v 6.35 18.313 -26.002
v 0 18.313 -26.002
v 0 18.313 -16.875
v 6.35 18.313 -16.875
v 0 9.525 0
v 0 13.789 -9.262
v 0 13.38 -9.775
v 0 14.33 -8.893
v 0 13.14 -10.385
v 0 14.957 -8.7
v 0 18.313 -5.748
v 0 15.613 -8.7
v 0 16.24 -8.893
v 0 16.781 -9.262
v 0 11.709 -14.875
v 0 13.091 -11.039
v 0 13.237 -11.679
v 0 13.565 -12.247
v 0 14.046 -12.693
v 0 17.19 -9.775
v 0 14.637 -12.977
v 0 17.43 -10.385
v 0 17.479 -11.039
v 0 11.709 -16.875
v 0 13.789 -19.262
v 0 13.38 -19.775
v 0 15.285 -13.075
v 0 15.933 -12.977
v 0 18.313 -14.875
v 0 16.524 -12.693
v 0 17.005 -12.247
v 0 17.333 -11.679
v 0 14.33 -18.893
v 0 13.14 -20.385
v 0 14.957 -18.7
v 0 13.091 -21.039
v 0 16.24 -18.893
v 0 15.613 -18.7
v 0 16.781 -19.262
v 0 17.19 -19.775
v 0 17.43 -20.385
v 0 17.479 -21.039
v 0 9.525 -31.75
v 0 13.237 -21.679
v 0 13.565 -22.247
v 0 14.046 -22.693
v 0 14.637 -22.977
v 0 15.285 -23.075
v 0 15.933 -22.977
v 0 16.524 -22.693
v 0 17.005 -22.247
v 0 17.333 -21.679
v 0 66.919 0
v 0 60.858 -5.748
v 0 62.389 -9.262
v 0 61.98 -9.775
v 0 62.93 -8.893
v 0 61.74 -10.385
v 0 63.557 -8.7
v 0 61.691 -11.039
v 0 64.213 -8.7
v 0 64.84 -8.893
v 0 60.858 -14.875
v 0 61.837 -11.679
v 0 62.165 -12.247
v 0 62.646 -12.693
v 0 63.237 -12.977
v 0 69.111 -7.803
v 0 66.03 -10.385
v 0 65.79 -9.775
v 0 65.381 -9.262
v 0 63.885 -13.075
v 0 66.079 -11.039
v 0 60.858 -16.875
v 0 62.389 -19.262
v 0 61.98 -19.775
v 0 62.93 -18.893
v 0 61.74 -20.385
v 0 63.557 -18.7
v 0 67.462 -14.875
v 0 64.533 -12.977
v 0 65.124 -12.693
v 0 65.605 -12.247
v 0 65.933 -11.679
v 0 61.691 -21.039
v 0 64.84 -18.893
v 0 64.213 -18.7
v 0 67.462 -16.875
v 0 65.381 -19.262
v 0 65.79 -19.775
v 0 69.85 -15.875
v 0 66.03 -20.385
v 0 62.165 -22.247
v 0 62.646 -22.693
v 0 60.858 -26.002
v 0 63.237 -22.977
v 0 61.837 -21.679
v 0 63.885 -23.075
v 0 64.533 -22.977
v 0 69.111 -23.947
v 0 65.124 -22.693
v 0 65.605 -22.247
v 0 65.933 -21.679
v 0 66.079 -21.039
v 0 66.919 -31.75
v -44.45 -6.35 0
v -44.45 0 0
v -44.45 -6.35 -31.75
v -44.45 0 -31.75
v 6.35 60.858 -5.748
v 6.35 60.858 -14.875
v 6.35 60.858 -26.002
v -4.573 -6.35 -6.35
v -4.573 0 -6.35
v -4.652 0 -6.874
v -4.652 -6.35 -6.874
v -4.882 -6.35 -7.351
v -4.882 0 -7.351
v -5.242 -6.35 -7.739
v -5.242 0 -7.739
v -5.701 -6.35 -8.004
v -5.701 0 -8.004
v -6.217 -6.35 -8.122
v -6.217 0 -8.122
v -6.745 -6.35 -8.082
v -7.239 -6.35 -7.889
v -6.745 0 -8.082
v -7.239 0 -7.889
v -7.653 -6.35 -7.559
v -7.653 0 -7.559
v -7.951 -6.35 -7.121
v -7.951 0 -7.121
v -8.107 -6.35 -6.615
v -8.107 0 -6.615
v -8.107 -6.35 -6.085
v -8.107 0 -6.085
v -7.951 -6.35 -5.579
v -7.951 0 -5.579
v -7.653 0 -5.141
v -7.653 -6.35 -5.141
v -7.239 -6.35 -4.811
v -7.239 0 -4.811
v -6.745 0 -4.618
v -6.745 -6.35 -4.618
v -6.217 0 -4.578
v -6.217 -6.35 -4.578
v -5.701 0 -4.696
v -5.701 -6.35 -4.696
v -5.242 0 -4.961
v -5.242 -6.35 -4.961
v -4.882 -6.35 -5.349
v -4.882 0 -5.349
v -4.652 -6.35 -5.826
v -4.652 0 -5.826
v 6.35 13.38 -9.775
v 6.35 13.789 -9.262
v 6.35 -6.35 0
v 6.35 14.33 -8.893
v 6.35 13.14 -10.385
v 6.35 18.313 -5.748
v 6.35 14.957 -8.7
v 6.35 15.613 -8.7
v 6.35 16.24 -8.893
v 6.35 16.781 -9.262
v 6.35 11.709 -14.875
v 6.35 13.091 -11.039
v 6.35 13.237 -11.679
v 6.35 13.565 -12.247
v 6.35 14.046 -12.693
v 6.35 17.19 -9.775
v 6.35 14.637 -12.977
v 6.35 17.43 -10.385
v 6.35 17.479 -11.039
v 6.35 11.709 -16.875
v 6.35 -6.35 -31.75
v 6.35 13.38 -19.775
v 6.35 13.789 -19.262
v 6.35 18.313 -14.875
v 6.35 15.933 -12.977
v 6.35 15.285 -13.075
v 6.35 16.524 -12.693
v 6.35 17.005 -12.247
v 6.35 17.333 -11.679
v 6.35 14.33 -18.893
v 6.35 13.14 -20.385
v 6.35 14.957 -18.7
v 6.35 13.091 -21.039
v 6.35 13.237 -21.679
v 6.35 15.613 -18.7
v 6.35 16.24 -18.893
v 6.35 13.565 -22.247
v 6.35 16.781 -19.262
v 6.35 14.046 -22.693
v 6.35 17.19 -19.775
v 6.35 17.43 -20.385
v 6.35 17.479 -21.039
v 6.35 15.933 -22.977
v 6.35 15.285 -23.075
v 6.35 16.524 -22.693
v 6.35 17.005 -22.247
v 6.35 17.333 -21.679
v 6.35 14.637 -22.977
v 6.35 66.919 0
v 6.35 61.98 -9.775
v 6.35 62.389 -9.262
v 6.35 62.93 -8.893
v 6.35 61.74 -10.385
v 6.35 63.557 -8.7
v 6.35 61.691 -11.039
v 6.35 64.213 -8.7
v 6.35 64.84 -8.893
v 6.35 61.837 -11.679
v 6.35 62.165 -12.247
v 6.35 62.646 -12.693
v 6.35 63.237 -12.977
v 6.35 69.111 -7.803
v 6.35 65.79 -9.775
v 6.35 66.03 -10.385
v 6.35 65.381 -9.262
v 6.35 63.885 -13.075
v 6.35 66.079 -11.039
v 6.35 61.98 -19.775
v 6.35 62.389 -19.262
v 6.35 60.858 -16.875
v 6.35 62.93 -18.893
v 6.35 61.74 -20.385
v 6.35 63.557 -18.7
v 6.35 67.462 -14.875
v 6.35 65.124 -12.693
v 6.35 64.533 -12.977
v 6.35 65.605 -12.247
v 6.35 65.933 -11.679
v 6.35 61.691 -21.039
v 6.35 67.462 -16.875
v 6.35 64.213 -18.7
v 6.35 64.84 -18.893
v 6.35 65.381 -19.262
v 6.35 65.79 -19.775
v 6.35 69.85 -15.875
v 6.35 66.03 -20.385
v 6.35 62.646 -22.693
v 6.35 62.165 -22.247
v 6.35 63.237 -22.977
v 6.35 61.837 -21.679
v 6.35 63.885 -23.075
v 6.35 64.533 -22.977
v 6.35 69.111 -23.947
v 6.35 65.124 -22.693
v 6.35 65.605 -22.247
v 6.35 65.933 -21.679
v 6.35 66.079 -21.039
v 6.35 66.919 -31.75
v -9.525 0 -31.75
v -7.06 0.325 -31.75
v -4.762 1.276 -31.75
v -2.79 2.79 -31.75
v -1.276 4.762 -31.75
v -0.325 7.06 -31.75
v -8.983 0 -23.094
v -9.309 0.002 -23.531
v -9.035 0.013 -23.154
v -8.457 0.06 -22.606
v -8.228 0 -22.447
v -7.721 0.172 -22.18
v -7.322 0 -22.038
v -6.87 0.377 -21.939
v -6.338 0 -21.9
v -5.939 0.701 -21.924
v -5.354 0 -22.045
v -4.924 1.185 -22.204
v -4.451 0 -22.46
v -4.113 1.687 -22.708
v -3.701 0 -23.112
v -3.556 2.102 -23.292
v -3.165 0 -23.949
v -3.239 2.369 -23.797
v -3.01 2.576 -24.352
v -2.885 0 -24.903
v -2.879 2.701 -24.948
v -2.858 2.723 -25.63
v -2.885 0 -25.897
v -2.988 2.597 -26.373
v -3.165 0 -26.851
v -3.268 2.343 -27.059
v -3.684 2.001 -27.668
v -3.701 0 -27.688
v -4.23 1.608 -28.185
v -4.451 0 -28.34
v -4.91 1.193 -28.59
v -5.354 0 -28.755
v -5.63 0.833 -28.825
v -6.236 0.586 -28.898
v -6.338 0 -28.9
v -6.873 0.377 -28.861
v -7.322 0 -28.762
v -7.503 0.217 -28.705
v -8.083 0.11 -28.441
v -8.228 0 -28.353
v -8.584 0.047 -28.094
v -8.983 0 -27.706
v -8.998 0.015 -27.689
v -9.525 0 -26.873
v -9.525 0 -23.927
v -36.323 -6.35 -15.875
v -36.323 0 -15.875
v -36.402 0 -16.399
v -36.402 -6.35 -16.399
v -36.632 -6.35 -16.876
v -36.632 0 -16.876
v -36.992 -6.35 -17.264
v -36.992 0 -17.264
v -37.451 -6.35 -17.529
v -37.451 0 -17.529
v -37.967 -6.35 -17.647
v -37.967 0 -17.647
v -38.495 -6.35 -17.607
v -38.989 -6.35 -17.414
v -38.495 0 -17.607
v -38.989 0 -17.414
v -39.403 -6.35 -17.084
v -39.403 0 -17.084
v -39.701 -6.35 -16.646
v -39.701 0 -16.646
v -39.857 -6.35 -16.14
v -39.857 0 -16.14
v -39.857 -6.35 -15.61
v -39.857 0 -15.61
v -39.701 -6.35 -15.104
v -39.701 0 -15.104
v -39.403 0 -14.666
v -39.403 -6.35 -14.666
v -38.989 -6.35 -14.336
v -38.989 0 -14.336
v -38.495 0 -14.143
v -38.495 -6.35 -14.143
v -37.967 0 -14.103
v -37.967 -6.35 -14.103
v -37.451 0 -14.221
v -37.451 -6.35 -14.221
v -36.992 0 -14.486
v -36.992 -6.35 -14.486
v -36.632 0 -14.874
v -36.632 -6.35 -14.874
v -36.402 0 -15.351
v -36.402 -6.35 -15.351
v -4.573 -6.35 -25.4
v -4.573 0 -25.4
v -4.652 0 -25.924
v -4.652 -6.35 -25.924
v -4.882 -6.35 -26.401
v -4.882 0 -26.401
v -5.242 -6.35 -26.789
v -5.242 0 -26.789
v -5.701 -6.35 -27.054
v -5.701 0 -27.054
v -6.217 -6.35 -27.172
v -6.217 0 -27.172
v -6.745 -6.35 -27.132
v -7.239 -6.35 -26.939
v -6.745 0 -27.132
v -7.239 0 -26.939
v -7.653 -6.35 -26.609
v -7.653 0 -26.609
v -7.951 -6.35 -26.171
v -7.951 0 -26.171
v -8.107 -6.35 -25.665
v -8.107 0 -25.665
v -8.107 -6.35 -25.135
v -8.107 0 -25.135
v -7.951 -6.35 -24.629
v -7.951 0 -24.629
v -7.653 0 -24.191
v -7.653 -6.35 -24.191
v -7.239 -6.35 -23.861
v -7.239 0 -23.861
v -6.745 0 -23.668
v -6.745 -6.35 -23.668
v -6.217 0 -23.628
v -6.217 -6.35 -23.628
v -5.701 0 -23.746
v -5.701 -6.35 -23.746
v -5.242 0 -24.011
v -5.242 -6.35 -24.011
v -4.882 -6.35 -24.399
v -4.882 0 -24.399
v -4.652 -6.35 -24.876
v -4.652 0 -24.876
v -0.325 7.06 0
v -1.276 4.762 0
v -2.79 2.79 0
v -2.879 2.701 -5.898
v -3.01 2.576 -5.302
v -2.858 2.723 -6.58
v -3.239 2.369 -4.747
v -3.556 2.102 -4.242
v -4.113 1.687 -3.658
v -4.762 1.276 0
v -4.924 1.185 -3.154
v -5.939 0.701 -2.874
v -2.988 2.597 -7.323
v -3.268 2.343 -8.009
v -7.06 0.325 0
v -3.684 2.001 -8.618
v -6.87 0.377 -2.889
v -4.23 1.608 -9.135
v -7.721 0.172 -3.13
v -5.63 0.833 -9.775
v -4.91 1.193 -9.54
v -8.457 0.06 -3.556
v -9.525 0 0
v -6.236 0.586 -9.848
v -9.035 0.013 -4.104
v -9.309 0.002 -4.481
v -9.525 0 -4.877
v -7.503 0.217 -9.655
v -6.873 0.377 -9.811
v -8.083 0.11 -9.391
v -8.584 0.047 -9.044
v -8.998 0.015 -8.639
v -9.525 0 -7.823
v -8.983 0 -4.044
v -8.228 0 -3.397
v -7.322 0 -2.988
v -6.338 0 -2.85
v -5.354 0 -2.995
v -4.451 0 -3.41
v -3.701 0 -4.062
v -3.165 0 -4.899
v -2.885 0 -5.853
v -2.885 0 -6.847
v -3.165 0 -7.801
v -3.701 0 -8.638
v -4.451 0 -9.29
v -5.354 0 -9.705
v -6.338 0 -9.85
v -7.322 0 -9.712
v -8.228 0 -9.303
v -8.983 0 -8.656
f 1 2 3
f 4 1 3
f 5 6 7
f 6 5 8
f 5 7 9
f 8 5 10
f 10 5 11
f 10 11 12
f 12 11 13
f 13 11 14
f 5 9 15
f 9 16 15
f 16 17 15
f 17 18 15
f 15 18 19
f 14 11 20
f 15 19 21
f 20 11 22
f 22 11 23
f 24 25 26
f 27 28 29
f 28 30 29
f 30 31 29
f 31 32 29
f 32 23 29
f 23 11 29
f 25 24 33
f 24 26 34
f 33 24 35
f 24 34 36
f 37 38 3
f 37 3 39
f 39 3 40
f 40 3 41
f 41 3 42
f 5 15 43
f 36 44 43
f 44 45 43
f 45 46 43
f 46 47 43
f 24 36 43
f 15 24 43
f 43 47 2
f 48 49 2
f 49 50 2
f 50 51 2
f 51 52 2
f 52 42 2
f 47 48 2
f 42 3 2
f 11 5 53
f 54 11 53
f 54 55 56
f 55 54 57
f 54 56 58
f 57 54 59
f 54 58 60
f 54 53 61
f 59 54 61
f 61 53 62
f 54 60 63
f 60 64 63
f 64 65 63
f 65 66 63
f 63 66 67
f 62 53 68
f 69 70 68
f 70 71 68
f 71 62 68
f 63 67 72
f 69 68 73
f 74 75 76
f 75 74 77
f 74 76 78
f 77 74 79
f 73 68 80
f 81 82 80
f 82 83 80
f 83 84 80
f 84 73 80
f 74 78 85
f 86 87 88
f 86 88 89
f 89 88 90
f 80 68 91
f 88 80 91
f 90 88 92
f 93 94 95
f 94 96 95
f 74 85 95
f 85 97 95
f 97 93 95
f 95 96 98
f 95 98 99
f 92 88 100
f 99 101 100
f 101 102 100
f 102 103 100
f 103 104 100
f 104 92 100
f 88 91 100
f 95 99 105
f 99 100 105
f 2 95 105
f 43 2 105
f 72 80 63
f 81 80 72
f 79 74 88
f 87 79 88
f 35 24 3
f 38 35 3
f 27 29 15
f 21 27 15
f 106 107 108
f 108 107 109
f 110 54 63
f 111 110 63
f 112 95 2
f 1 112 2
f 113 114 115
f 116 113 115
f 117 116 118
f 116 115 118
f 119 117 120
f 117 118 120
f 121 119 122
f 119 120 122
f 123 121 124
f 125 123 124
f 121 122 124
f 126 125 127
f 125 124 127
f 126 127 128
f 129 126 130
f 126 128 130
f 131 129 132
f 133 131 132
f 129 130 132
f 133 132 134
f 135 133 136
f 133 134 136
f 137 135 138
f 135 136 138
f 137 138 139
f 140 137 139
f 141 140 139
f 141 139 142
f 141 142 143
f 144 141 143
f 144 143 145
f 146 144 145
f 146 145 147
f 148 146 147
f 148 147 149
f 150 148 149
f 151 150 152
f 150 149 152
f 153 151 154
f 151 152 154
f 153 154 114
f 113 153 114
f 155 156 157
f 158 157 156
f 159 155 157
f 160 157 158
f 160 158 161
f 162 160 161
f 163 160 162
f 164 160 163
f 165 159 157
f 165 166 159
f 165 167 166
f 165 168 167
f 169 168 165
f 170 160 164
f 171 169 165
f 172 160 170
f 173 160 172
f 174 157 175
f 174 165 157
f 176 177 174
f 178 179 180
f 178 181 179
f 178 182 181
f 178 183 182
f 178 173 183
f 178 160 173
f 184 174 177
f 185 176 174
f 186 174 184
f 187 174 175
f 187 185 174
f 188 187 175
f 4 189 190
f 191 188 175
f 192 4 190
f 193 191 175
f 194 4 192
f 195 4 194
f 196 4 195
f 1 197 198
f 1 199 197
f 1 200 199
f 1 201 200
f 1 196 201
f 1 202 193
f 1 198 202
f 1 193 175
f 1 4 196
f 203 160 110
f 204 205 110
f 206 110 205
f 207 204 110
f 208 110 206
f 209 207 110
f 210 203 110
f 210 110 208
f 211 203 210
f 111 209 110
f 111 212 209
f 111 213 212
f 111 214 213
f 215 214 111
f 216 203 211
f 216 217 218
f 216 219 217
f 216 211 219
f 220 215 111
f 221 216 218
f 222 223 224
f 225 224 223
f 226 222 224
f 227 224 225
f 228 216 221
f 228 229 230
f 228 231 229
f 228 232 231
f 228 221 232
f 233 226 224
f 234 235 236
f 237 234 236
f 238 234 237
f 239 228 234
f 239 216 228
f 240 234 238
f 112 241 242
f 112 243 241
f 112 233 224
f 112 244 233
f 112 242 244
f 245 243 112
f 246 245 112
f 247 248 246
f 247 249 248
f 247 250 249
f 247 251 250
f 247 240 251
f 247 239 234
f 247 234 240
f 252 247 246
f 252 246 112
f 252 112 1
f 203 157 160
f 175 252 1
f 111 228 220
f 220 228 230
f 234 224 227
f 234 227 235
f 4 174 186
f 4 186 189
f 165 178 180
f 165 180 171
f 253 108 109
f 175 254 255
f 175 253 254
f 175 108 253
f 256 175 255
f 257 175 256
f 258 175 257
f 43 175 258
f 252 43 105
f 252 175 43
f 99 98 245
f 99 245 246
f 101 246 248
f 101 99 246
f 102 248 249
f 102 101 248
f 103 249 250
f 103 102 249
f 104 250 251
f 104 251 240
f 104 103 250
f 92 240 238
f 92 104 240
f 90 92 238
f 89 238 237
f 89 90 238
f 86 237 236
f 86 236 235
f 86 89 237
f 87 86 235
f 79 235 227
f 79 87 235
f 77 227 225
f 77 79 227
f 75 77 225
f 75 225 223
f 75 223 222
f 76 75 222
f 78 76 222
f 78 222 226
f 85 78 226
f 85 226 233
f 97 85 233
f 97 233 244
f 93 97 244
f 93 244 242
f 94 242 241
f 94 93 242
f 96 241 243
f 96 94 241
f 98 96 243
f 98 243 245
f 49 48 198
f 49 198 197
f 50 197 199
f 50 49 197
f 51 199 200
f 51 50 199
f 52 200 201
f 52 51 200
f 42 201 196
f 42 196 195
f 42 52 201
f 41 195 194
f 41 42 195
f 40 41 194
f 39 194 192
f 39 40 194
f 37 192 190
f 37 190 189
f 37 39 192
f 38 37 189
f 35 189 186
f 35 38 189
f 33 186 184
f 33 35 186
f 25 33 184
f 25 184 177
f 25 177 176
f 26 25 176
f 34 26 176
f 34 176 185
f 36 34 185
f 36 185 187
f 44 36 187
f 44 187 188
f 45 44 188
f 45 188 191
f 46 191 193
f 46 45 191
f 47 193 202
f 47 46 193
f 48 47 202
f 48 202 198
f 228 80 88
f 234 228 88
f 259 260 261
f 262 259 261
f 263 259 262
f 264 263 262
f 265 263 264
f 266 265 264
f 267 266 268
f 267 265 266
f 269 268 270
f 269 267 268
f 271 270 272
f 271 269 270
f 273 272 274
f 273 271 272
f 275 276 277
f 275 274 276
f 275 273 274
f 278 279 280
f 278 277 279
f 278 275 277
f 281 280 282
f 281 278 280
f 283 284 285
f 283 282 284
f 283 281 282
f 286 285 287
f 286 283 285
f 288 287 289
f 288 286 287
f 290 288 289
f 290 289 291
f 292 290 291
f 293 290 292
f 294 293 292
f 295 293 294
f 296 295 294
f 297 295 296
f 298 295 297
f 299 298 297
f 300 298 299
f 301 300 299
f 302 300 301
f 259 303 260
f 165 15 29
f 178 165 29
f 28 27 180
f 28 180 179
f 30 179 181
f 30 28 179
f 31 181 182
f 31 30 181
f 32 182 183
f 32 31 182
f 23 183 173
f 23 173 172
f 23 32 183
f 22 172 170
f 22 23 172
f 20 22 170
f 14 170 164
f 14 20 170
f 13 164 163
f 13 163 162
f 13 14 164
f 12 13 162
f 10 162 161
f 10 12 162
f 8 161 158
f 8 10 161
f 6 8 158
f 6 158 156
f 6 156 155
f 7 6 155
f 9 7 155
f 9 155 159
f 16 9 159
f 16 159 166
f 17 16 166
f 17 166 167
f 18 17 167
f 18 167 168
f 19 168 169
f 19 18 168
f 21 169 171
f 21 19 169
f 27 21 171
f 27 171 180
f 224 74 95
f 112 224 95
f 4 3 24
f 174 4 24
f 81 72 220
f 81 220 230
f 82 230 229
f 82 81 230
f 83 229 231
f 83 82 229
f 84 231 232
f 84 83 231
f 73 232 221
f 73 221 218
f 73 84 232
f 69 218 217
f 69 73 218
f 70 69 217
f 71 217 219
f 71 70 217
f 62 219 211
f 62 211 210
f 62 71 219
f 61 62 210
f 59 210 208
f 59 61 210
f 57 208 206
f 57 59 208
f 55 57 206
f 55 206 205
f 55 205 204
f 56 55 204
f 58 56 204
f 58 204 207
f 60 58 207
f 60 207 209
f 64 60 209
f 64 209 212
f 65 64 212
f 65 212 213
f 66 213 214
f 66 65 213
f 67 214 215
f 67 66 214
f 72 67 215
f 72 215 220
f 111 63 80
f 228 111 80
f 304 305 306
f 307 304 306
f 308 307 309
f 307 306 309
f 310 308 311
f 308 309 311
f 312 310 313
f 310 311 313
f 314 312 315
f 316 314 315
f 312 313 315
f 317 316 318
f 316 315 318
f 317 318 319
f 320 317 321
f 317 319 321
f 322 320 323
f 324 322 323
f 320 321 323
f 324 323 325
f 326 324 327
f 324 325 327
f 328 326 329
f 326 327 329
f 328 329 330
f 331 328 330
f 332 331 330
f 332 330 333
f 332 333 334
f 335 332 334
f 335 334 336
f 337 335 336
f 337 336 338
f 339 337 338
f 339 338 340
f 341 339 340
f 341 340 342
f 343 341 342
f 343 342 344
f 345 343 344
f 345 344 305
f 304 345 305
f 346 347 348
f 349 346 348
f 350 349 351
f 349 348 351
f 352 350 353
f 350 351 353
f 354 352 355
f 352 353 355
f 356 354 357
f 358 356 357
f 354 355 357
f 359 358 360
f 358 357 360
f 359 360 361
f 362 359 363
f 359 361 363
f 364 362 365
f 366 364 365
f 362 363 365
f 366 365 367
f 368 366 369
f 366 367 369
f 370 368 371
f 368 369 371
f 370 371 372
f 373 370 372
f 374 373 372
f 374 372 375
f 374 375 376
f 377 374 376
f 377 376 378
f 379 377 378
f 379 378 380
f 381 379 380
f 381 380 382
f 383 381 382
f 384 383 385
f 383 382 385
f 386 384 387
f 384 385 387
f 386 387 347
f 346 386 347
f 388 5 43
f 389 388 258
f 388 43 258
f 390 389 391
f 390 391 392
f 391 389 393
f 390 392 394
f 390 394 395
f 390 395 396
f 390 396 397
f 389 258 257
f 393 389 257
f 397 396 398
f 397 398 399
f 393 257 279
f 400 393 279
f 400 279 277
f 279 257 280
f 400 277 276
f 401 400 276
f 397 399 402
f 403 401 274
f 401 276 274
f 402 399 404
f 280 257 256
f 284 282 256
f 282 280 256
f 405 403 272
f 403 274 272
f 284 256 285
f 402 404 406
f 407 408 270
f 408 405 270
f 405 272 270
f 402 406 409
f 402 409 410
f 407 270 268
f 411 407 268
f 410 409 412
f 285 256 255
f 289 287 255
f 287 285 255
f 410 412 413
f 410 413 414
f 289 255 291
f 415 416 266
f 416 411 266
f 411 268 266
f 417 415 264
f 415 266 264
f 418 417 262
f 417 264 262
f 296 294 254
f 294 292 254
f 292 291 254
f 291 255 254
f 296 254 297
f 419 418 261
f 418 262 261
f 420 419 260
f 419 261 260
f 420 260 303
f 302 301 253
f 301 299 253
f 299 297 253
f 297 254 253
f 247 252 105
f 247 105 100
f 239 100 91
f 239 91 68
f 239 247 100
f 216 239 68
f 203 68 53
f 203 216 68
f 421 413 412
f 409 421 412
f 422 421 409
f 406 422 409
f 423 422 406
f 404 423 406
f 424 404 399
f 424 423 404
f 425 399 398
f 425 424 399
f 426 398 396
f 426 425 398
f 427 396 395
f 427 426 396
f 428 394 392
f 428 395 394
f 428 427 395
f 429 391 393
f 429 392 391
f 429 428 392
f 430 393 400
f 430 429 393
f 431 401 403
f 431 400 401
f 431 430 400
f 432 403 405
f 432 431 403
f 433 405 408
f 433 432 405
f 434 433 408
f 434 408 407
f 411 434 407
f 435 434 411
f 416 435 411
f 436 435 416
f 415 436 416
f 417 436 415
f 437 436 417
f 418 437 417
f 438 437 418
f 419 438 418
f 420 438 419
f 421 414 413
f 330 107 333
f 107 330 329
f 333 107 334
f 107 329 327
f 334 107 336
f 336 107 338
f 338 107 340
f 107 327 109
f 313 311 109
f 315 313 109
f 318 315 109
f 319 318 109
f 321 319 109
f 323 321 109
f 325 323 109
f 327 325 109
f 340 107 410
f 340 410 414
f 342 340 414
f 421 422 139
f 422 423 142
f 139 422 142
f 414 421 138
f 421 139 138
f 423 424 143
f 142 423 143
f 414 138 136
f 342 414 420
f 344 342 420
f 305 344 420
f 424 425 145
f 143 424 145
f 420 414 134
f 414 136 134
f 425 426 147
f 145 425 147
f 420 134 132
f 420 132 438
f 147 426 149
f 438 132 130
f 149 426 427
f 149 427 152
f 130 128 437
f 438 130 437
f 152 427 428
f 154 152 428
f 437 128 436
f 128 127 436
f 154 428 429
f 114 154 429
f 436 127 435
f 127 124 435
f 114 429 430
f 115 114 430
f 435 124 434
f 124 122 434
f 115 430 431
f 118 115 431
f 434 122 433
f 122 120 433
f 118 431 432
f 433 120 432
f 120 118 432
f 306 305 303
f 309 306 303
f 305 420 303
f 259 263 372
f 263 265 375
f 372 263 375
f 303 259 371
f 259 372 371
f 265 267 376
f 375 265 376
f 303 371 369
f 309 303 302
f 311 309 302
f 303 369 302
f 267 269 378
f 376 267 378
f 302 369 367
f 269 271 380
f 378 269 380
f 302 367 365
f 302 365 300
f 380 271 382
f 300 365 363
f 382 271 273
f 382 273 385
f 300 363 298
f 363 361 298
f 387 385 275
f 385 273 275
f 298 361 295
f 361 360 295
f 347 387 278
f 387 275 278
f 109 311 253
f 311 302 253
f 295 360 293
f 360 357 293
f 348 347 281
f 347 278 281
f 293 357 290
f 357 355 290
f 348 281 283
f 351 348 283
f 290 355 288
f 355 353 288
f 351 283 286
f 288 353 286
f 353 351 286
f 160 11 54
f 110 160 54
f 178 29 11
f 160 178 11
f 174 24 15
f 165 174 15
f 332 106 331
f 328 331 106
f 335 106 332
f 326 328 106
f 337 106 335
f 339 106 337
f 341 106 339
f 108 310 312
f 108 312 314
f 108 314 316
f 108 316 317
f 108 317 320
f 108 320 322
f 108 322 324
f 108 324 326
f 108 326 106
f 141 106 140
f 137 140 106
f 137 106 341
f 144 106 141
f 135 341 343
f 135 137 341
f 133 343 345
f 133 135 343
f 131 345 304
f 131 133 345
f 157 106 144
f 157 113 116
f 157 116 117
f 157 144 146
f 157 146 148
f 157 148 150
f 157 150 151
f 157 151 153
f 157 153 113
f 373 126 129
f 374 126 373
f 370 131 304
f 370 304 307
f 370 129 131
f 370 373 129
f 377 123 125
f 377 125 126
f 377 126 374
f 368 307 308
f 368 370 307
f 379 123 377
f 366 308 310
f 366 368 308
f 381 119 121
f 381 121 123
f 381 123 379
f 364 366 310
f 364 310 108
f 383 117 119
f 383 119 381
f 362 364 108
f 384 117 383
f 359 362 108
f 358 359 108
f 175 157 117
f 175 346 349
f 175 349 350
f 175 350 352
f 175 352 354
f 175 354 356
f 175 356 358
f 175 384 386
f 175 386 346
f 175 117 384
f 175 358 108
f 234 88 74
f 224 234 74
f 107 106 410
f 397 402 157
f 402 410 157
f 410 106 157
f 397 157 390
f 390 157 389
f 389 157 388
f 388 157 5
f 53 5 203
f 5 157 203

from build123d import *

# Parameters (mm, degrees)
SKETCH3_W               = 31.75
SKETCH3_H               = 73.557500078
SKETCH3_R               = 2.200000045
BOSS_EXTRUDE1_DEPTH     = 6.35
SKETCH5_W               = 31.75
SKETCH5_H               = 6.35
BOSS_EXTRUDE2_DEPTH     = 50.8
FILLET1_R               = 9.525
SKETCH6_R               = 1.777000002
CUT_EXTRUDE1_DEPTH      = 74.557500078
CUT_EXTRUDE1_DEPTH_BACK = 7.35
CUT_EXTRUDE2_DEPTH      = 51.8
SKETCH8_R               = 3.499999985
CUT_EXTRUDE3_DEPTH      = 70.85


with BuildPart() as part:
    # Sketch3 → Boss-Extrude1 (new body)
    with BuildSketch(Plane(origin=(0, 0, 0), x_dir=(0, 0, -1), z_dir=(1, 0, 0))):
        with Locations((15.875, 36.778750039)):
            Rectangle(SKETCH3_W, SKETCH3_H)
        with Locations((10.874999967, 15.285000037)):
            Circle(SKETCH3_R, mode=Mode.SUBTRACT)
        with Locations((20.875000033, 15.285000037)):
            Circle(SKETCH3_R, mode=Mode.SUBTRACT)
        with Locations((10.874999967, 63.885000119)):
            Circle(SKETCH3_R, mode=Mode.SUBTRACT)
        with Locations((20.875000033, 63.885000119)):
            Circle(SKETCH3_R, mode=Mode.SUBTRACT)
        Polygon((5.748000061, 60.857500078), (14.875, 60.857500078), (14.875, 67.461500078), (16.875, 67.461500078), (16.875, 60.857500078), (26.001999939, 60.857500078), (26.001999939, 18.312500078), (16.875, 18.312500078), (16.875, 11.708500078), (14.875, 11.708500078), (14.875, 18.312500078), (5.748000061, 18.312500078), align=None, mode=Mode.SUBTRACT)
    extrude(amount=BOSS_EXTRUDE1_DEPTH)

    # Sketch5 → Boss-Extrude2 (add)
    with BuildSketch(Plane(origin=(6.35, 0, 0), x_dir=(0, 0, -1), z_dir=(1, 0, 0))):
        with Locations((15.875, -3.175)):
            Rectangle(SKETCH5_W, SKETCH5_H)
    extrude(amount=-BOSS_EXTRUDE2_DEPTH)

    # Fillet1
    fillet1_edges = [part.edges().sort_by_distance(p)[0] for p in [
        (0, 0, -15.875),
    ]]
    fillet(fillet1_edges, radius=FILLET1_R)

    # Sketch6 → Cut-Extrude1 (cut, two sides)
    with BuildSketch(Plane(origin=(0, 0, 0), x_dir=(1, 0, 0), z_dir=(0, 1, 0))) as cut_extrude1_sk:
        with Locations((-6.35, 6.35)):
            Circle(SKETCH6_R)
        with Locations((-38.1, 15.875)):
            Circle(SKETCH6_R)
        with Locations((-6.35, 25.4)):
            Circle(SKETCH6_R)
    extrude(amount=CUT_EXTRUDE1_DEPTH, mode=Mode.SUBTRACT)
    extrude(cut_extrude1_sk.sketch, amount=-CUT_EXTRUDE1_DEPTH_BACK, mode=Mode.SUBTRACT)

    # Sketch7 → Cut-Extrude2 (cut, through all)
    with BuildSketch(Plane(origin=(6.35, 0, 0), x_dir=(0, 0, -1), z_dir=(1, 0, 0))):
        with BuildLine():
            Line((0, 66.918512437), (0, 82.748877538))
            Line((0, 82.748877538), (31.75, 82.748877538))
            Line((31.75, 82.748877538), (31.75, 66.918512437))
            ThreePointArc((31.75, 66.918512437), (15.875, 69.85), (0, 66.918512437))
        make_face()
    extrude(amount=-CUT_EXTRUDE2_DEPTH, mode=Mode.SUBTRACT)

    # Sketch8 → Cut-Extrude3 (cut, through all)
    with BuildSketch(Plane(origin=(0, 0, 0), x_dir=(1, 0, 0), z_dir=(0, 1, 0))):
        with Locations((-6.35, 25.4)):
            Circle(SKETCH8_R)
        with Locations((-6.35, 6.35)):
            Circle(SKETCH8_R)
    extrude(amount=CUT_EXTRUDE3_DEPTH, mode=Mode.SUBTRACT)


solid = part.part
